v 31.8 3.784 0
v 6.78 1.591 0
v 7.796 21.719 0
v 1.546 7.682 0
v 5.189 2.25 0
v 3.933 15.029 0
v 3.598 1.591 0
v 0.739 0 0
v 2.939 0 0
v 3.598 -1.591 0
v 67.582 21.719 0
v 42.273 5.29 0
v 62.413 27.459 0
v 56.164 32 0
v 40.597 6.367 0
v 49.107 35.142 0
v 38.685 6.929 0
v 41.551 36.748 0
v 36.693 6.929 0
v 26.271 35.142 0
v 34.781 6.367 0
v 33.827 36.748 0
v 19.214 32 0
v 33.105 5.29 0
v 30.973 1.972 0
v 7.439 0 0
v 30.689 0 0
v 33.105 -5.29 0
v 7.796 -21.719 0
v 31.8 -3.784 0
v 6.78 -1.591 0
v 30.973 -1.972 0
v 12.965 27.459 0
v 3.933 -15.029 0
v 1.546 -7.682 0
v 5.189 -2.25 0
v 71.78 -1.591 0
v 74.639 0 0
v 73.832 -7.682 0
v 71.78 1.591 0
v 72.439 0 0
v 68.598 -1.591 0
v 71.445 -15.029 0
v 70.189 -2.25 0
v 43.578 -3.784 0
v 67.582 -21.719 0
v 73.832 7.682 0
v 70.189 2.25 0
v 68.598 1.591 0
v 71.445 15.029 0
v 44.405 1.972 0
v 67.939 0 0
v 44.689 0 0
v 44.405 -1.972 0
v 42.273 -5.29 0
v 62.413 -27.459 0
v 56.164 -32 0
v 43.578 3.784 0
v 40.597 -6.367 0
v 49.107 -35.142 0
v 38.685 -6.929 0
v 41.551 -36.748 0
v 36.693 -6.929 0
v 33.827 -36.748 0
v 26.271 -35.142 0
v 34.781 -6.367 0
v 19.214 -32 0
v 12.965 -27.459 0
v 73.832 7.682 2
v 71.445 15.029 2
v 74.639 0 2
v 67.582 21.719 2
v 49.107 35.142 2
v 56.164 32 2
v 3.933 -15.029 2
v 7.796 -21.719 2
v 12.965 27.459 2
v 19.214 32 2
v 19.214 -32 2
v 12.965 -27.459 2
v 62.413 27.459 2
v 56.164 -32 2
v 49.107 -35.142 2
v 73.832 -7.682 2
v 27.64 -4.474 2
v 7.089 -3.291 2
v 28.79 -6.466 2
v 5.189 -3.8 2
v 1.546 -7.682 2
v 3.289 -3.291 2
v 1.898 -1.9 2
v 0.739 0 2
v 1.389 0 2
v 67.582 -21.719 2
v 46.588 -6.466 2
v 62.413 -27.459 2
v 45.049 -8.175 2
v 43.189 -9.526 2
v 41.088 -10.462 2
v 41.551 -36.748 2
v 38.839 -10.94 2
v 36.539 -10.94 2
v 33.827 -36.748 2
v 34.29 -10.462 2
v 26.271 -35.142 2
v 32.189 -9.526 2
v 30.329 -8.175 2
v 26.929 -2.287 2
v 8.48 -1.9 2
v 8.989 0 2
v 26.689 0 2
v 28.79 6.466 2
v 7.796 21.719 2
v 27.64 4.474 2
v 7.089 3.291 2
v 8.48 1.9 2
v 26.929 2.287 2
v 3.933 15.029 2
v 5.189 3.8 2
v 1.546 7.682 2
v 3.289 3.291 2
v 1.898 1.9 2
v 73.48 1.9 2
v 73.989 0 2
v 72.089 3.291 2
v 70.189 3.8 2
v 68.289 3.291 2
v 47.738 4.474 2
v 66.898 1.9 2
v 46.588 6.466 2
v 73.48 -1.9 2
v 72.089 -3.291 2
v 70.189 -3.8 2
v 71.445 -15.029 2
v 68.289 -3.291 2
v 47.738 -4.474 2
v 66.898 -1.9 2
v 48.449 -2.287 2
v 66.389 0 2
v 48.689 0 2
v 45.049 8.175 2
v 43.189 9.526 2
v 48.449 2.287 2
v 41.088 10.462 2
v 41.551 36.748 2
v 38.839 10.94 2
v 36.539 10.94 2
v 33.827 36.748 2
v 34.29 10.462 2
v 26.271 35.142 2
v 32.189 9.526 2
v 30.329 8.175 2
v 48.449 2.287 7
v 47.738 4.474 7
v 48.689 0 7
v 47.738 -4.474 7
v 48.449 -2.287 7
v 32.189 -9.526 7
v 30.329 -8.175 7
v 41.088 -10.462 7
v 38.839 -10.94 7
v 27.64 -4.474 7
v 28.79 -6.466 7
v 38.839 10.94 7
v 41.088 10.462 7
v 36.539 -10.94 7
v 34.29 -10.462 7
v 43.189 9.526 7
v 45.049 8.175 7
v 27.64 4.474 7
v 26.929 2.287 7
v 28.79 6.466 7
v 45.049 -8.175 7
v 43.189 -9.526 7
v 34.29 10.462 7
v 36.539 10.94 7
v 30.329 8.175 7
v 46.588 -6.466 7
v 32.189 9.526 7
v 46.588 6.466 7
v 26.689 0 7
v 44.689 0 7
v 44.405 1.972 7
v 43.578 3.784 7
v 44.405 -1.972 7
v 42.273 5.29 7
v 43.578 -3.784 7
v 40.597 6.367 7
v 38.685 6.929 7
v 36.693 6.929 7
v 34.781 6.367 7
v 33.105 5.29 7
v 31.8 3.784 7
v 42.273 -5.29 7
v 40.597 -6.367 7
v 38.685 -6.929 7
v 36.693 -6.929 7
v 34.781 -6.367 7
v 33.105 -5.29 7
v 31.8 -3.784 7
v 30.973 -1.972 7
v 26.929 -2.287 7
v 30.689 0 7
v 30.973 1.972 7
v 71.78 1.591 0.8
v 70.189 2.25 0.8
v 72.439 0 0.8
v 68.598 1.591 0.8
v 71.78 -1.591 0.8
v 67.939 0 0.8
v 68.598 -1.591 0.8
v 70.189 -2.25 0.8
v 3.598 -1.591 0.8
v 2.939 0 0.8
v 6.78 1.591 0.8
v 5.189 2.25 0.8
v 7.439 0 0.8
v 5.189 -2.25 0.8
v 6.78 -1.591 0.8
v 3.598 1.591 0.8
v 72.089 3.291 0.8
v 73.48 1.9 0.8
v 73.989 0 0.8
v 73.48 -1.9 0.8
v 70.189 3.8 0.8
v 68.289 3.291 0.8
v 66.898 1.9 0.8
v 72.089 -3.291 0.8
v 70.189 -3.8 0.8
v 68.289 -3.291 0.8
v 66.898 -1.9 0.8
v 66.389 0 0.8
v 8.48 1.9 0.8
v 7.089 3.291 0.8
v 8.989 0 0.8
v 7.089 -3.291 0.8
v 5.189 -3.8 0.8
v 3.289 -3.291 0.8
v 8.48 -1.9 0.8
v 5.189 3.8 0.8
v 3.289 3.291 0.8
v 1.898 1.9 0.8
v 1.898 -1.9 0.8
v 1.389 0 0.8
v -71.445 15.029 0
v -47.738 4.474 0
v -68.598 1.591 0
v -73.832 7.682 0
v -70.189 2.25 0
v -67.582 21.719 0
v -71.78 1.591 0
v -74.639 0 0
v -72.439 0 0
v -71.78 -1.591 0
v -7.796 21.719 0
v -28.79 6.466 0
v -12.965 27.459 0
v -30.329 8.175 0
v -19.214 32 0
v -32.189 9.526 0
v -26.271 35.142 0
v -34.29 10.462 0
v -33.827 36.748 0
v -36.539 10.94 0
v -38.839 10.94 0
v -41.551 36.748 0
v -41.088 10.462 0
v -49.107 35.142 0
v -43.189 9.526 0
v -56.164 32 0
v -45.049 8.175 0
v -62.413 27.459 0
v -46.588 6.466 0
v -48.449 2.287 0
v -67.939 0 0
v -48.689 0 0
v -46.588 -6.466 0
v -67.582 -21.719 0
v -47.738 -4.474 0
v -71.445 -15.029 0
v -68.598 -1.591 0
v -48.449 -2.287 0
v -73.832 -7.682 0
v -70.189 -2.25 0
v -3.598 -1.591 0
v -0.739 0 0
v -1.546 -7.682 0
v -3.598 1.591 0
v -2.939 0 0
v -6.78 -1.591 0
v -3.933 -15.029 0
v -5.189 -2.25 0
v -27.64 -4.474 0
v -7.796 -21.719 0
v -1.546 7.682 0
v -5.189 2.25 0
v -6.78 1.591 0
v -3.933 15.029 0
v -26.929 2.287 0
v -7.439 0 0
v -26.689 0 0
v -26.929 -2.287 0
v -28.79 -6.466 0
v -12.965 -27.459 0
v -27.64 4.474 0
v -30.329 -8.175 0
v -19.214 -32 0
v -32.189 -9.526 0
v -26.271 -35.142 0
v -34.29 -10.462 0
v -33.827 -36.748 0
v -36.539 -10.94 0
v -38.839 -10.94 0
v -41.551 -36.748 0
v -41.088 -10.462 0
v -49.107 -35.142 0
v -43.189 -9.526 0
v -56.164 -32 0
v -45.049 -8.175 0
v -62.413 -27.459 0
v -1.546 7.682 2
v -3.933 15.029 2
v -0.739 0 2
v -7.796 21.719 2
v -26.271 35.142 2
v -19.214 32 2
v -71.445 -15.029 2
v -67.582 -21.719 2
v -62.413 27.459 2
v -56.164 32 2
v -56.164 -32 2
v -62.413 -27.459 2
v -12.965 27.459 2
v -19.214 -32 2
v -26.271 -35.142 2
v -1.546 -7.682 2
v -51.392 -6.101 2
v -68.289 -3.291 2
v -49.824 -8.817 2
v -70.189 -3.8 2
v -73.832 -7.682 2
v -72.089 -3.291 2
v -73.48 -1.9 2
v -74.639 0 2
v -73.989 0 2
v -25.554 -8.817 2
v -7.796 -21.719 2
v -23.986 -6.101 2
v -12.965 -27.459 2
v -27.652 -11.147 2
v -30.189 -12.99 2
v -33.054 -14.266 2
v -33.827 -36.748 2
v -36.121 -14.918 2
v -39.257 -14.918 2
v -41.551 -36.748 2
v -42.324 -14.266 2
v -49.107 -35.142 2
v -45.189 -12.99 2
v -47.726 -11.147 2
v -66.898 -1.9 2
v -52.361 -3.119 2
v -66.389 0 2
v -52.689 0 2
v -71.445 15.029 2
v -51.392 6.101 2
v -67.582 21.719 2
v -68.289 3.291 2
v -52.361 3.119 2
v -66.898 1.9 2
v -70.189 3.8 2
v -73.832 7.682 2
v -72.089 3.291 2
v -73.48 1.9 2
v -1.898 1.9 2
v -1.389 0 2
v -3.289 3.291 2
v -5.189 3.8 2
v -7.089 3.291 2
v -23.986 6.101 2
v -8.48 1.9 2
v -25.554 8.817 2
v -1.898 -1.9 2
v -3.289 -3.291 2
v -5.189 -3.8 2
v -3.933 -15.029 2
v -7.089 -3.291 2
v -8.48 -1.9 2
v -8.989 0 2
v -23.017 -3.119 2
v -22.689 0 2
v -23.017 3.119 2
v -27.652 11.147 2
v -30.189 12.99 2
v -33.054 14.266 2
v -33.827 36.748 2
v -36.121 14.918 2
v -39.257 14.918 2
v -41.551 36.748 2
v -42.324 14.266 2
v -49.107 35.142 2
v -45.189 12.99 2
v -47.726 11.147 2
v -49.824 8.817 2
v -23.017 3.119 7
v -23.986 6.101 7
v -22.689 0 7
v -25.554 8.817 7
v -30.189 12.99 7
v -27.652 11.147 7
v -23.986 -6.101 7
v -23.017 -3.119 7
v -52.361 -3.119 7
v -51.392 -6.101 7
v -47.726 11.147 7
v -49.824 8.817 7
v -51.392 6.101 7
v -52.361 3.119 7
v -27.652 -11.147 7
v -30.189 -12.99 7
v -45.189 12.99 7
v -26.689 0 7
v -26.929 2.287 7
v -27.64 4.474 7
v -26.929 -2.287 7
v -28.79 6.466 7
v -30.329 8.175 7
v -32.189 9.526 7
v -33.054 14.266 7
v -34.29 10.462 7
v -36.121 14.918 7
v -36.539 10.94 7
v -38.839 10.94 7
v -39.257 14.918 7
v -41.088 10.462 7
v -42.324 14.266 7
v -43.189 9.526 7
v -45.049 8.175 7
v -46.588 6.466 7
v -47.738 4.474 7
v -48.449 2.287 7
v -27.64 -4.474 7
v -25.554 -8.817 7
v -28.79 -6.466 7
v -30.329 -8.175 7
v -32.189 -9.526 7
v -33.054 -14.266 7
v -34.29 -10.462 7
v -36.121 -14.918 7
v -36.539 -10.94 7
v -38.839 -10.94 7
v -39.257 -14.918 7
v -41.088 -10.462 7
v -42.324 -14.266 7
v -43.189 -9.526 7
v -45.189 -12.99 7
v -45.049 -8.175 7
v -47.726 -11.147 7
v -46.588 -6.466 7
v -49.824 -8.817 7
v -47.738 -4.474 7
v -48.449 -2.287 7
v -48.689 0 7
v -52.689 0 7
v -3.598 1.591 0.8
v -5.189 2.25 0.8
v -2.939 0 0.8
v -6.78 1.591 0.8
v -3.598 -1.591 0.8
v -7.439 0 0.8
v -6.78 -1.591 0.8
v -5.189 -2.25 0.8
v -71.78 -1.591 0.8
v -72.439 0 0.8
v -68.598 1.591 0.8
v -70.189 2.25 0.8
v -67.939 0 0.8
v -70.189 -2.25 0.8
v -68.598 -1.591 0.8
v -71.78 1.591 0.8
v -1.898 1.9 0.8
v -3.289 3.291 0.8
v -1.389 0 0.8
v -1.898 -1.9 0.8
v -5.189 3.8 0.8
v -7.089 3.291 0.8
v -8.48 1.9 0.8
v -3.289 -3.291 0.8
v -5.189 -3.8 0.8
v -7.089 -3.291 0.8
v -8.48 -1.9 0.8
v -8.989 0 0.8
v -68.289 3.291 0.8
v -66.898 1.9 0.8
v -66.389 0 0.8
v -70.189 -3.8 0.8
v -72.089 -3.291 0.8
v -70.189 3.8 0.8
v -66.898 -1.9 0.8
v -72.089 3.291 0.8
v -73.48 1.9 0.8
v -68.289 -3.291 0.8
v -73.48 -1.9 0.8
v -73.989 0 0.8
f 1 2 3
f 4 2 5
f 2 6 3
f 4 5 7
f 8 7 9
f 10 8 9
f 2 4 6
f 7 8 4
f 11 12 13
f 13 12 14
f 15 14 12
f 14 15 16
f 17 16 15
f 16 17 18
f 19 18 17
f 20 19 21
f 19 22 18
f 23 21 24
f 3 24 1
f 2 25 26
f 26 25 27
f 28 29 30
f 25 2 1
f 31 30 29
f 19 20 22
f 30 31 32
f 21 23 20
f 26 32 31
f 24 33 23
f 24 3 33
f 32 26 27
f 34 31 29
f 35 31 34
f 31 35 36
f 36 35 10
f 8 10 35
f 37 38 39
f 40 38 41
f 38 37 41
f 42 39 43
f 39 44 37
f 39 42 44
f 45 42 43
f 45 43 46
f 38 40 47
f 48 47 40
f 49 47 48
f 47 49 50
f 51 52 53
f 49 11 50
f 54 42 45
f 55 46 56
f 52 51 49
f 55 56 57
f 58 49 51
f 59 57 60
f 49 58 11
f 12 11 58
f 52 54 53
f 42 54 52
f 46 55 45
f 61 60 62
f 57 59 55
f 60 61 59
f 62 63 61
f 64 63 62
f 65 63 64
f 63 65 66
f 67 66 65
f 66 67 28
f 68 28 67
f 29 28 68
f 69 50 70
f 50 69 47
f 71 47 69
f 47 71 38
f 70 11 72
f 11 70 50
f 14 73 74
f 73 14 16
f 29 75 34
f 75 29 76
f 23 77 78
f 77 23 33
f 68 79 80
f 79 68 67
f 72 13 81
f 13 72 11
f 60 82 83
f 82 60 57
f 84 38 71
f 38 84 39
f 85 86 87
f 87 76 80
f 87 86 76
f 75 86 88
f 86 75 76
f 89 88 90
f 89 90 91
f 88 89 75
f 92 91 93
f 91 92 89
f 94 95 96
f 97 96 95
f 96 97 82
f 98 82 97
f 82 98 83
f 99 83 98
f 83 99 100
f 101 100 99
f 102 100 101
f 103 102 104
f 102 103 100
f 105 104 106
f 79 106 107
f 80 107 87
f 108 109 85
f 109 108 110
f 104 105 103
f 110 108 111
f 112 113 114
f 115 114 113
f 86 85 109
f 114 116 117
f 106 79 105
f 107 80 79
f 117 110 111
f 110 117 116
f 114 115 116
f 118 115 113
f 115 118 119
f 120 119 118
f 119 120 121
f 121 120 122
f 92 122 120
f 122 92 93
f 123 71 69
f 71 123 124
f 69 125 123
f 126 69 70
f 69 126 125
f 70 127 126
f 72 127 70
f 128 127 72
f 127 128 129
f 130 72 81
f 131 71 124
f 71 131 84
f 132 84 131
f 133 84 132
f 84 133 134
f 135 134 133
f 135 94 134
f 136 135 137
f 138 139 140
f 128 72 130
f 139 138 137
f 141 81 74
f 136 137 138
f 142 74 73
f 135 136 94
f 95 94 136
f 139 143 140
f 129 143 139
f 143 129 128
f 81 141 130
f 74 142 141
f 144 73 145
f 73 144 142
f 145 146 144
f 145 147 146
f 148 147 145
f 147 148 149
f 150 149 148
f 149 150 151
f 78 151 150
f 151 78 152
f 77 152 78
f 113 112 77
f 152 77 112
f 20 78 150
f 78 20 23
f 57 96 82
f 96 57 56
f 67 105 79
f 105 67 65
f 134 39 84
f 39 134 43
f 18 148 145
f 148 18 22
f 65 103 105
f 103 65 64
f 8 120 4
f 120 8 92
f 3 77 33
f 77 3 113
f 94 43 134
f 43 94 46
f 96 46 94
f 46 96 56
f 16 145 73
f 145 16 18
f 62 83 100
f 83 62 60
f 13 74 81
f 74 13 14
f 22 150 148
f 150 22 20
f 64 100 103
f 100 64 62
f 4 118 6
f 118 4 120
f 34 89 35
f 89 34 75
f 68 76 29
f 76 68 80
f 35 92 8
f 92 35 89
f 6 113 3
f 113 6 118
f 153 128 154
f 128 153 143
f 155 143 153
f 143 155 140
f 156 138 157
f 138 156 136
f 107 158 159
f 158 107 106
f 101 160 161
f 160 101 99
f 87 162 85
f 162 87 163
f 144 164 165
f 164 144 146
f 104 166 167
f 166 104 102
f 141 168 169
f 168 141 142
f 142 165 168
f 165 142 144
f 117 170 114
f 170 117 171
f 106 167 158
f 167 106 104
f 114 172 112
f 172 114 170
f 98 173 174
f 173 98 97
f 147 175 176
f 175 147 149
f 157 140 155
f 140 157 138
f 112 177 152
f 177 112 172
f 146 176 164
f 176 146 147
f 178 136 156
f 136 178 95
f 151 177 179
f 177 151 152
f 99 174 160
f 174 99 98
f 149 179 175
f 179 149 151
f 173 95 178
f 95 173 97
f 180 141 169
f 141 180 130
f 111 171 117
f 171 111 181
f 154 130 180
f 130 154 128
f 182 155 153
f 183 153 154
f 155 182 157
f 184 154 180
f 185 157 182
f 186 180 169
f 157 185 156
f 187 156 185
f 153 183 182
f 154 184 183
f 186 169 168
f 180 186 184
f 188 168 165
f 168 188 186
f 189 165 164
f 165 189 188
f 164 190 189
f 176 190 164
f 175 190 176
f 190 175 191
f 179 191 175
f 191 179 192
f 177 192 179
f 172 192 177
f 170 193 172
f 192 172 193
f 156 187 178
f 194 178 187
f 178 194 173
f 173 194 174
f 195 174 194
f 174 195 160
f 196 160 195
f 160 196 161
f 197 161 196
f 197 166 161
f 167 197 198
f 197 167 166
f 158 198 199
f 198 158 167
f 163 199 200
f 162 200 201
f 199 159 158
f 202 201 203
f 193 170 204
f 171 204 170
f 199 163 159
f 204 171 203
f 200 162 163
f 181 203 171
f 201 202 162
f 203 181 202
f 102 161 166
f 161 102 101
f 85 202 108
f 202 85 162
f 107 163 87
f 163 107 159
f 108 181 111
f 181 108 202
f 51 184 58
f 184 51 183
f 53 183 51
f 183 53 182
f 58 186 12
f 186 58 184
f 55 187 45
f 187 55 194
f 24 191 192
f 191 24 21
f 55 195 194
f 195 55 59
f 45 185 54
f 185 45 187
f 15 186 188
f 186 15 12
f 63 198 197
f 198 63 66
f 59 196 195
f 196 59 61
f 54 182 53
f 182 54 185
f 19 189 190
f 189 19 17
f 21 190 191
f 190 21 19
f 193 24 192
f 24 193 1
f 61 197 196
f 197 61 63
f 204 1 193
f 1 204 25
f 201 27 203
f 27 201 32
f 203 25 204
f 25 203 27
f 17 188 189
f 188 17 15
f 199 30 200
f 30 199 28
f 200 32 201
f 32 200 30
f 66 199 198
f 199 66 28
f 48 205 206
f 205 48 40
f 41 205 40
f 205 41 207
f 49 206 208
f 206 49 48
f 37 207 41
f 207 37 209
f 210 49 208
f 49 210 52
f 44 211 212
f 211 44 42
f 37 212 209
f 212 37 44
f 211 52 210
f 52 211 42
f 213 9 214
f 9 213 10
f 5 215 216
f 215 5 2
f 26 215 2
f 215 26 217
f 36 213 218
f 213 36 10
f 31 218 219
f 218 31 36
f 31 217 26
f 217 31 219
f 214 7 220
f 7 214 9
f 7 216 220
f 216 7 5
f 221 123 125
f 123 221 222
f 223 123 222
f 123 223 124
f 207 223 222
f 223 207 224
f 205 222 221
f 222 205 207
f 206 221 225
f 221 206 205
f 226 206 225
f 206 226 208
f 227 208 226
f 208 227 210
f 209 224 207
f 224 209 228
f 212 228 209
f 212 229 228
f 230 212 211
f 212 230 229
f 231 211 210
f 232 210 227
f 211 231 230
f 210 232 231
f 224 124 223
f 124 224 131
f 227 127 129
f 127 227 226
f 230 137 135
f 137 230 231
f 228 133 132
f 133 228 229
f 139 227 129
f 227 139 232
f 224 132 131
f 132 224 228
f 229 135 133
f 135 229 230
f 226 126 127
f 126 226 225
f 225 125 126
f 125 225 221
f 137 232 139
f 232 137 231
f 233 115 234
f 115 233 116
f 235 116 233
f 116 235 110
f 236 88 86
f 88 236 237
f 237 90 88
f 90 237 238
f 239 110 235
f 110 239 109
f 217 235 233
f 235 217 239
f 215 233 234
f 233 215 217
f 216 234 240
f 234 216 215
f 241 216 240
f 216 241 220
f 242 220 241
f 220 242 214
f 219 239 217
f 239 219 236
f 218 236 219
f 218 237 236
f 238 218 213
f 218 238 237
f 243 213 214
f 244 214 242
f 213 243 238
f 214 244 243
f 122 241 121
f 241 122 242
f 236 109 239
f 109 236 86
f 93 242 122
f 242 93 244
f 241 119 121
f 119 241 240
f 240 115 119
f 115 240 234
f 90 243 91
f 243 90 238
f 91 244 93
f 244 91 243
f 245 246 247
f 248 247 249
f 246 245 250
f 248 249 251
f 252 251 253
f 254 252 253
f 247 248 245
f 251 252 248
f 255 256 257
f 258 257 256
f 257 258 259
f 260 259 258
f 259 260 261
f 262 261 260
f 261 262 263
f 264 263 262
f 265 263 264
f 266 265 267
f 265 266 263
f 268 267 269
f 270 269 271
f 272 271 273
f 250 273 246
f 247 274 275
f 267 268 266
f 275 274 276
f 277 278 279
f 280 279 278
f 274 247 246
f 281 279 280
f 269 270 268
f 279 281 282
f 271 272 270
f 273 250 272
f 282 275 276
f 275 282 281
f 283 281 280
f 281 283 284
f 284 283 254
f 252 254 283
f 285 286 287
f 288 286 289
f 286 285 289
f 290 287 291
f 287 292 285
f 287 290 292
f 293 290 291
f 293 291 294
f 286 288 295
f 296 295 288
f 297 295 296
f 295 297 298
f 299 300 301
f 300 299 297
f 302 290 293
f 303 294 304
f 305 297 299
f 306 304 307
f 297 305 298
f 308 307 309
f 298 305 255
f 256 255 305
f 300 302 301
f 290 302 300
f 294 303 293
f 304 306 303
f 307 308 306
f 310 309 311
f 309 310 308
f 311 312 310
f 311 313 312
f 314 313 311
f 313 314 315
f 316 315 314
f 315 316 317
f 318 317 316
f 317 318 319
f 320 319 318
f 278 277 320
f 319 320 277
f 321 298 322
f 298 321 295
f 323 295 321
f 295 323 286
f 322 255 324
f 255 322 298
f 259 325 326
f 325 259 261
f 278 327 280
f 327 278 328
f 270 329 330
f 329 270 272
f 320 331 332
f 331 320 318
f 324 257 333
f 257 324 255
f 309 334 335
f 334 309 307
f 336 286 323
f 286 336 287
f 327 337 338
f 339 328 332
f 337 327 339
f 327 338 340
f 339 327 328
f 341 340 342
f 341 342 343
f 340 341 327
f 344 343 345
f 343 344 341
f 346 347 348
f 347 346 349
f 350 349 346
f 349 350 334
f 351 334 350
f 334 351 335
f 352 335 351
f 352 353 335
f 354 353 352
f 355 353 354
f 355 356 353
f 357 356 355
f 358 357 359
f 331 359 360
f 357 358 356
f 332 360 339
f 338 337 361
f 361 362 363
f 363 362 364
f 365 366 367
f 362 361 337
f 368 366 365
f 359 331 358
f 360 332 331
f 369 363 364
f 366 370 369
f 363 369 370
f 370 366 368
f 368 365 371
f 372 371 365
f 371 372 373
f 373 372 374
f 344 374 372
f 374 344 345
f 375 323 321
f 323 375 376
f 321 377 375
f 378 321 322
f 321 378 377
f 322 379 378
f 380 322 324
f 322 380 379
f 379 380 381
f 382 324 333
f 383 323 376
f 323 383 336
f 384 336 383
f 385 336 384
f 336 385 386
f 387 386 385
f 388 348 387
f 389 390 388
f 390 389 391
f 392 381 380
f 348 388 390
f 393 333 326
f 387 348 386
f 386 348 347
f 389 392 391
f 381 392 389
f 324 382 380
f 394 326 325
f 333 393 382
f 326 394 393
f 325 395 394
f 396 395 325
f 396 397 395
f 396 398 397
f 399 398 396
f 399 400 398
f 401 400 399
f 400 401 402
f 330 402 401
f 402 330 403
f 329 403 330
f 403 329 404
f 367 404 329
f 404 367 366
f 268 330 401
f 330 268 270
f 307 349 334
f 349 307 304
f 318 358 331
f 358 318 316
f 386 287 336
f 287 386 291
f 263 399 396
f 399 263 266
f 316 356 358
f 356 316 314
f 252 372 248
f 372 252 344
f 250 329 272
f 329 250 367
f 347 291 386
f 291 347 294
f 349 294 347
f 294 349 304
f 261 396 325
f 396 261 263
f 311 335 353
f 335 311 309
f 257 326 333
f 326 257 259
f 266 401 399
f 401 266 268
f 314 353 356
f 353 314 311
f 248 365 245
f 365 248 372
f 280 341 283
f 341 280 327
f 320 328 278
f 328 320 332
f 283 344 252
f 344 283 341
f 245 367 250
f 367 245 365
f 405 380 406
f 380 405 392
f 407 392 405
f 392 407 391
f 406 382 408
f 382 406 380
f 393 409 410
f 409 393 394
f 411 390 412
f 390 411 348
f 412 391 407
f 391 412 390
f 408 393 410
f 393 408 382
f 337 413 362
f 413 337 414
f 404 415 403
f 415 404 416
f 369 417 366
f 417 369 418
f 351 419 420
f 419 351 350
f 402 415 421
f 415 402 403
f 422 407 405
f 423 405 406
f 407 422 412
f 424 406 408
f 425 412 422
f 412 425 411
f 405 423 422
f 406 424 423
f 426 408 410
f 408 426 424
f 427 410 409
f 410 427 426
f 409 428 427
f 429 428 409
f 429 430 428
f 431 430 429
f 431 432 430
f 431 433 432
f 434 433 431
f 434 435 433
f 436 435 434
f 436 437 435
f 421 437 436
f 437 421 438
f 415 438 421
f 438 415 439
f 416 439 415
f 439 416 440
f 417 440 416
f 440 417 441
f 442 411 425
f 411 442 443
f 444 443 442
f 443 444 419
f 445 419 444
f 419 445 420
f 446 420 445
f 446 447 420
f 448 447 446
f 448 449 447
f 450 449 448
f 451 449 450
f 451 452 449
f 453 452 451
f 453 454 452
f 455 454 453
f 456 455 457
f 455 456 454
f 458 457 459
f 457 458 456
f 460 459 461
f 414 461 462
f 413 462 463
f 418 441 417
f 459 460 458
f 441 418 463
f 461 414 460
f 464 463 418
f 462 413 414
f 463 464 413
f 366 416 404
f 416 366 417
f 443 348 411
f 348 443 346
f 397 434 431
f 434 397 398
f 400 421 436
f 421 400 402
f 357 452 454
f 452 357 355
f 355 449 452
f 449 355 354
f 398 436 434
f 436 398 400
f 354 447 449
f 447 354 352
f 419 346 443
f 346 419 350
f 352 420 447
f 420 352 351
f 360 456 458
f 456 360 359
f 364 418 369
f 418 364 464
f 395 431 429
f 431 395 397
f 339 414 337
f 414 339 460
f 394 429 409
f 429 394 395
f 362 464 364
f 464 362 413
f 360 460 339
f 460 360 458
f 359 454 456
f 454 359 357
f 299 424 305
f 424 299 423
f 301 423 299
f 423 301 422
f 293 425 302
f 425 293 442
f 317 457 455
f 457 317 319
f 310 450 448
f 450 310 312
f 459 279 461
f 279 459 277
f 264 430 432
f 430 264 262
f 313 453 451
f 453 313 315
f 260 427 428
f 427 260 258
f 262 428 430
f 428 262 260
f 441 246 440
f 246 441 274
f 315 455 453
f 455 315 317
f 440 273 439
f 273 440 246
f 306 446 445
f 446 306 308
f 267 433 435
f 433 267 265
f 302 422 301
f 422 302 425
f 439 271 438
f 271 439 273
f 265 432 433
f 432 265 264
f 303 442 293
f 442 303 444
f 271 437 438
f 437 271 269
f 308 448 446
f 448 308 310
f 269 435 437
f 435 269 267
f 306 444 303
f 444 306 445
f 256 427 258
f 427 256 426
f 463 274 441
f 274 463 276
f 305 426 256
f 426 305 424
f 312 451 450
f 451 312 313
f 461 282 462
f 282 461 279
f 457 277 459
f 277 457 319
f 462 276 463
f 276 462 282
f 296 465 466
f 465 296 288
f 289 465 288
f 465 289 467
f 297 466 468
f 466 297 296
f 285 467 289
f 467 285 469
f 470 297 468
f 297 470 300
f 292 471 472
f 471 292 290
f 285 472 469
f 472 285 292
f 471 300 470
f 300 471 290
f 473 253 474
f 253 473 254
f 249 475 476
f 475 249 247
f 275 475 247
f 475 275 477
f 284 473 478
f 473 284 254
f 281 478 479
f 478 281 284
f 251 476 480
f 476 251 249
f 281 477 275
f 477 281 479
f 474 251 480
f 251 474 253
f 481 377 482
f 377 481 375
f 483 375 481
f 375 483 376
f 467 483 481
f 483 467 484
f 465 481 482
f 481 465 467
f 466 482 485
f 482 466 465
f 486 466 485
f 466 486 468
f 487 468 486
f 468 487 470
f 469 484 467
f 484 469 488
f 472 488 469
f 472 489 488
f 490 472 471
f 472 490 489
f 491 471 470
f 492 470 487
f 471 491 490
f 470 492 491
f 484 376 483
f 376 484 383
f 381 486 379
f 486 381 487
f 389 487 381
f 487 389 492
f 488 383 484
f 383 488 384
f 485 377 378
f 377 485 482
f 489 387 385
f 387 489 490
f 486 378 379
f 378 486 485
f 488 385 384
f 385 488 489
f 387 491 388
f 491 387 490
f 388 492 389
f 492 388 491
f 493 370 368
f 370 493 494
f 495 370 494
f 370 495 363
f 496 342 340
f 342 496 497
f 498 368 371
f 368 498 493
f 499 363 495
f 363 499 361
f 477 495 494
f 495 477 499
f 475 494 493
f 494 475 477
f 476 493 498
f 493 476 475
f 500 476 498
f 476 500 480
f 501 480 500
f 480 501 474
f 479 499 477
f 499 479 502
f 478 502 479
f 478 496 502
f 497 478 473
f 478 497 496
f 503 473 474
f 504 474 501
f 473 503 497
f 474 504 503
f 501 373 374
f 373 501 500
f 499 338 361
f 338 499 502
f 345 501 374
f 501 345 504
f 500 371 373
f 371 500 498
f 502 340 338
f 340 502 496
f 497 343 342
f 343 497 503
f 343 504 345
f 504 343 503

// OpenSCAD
// Diameter of the router bit
rdia =8;
// Safety distance between router bit and bushing
distance = 3;
// Material thickness of the bushing
material = 4;

// Diameter of the plate of the router
routerplatediameter = 73.9;
// Distance of the screwholes
routerplatescrewdistance = 65;
// Thickness of the router plate
routerplatethickness = 2;
// Thickness of the guide bushing
guidebushingheight = 5;
// Diameter of the screwholes
screwdiameter = 4.5;
// Diameter of the screwheads
screwheaddiameter = 7.6;
// Height of the screwheads
screwheadheight = 1.2;


rradius = rdia / 2;
innerradius1 = rradius + distance;
outerradius1 = innerradius1 + material;
outerradius2 = rdia + distance + material;
innerradius2 = rdia + distance;

translate([0.51*routerplatediameter,0,0])
    Bushing(innerradius1*2, outerradius1*2);
translate([-0.51*routerplatediameter,0,0])
    Bushing(innerradius2*2, outerradius2*2);

module Bushing(inner, outer) {
    lift = routerplatethickness - screwheadheight;
    difference() {
        union() {
            cylinder(d=routerplatediameter, h=routerplatethickness);
            cylinder(d=outer, h=routerplatethickness+guidebushingheight);

        }
        cylinder(d=inner, h=routerplatethickness+guidebushingheight);

        translate([routerplatescrewdistance/2,0,0]) cylinder(d=screwdiameter, h=routerplatethickness);
        translate([-routerplatescrewdistance/2,0,0]) cylinder(d=screwdiameter, h=routerplatethickness);
        translate([routerplatescrewdistance/2,0,lift]) cylinder(d=screwheaddiameter, h=screwheadheight);
        translate([-routerplatescrewdistance/2,0,lift]) cylinder(d=screwheaddiameter, h=screwheadheight);
    }
}
